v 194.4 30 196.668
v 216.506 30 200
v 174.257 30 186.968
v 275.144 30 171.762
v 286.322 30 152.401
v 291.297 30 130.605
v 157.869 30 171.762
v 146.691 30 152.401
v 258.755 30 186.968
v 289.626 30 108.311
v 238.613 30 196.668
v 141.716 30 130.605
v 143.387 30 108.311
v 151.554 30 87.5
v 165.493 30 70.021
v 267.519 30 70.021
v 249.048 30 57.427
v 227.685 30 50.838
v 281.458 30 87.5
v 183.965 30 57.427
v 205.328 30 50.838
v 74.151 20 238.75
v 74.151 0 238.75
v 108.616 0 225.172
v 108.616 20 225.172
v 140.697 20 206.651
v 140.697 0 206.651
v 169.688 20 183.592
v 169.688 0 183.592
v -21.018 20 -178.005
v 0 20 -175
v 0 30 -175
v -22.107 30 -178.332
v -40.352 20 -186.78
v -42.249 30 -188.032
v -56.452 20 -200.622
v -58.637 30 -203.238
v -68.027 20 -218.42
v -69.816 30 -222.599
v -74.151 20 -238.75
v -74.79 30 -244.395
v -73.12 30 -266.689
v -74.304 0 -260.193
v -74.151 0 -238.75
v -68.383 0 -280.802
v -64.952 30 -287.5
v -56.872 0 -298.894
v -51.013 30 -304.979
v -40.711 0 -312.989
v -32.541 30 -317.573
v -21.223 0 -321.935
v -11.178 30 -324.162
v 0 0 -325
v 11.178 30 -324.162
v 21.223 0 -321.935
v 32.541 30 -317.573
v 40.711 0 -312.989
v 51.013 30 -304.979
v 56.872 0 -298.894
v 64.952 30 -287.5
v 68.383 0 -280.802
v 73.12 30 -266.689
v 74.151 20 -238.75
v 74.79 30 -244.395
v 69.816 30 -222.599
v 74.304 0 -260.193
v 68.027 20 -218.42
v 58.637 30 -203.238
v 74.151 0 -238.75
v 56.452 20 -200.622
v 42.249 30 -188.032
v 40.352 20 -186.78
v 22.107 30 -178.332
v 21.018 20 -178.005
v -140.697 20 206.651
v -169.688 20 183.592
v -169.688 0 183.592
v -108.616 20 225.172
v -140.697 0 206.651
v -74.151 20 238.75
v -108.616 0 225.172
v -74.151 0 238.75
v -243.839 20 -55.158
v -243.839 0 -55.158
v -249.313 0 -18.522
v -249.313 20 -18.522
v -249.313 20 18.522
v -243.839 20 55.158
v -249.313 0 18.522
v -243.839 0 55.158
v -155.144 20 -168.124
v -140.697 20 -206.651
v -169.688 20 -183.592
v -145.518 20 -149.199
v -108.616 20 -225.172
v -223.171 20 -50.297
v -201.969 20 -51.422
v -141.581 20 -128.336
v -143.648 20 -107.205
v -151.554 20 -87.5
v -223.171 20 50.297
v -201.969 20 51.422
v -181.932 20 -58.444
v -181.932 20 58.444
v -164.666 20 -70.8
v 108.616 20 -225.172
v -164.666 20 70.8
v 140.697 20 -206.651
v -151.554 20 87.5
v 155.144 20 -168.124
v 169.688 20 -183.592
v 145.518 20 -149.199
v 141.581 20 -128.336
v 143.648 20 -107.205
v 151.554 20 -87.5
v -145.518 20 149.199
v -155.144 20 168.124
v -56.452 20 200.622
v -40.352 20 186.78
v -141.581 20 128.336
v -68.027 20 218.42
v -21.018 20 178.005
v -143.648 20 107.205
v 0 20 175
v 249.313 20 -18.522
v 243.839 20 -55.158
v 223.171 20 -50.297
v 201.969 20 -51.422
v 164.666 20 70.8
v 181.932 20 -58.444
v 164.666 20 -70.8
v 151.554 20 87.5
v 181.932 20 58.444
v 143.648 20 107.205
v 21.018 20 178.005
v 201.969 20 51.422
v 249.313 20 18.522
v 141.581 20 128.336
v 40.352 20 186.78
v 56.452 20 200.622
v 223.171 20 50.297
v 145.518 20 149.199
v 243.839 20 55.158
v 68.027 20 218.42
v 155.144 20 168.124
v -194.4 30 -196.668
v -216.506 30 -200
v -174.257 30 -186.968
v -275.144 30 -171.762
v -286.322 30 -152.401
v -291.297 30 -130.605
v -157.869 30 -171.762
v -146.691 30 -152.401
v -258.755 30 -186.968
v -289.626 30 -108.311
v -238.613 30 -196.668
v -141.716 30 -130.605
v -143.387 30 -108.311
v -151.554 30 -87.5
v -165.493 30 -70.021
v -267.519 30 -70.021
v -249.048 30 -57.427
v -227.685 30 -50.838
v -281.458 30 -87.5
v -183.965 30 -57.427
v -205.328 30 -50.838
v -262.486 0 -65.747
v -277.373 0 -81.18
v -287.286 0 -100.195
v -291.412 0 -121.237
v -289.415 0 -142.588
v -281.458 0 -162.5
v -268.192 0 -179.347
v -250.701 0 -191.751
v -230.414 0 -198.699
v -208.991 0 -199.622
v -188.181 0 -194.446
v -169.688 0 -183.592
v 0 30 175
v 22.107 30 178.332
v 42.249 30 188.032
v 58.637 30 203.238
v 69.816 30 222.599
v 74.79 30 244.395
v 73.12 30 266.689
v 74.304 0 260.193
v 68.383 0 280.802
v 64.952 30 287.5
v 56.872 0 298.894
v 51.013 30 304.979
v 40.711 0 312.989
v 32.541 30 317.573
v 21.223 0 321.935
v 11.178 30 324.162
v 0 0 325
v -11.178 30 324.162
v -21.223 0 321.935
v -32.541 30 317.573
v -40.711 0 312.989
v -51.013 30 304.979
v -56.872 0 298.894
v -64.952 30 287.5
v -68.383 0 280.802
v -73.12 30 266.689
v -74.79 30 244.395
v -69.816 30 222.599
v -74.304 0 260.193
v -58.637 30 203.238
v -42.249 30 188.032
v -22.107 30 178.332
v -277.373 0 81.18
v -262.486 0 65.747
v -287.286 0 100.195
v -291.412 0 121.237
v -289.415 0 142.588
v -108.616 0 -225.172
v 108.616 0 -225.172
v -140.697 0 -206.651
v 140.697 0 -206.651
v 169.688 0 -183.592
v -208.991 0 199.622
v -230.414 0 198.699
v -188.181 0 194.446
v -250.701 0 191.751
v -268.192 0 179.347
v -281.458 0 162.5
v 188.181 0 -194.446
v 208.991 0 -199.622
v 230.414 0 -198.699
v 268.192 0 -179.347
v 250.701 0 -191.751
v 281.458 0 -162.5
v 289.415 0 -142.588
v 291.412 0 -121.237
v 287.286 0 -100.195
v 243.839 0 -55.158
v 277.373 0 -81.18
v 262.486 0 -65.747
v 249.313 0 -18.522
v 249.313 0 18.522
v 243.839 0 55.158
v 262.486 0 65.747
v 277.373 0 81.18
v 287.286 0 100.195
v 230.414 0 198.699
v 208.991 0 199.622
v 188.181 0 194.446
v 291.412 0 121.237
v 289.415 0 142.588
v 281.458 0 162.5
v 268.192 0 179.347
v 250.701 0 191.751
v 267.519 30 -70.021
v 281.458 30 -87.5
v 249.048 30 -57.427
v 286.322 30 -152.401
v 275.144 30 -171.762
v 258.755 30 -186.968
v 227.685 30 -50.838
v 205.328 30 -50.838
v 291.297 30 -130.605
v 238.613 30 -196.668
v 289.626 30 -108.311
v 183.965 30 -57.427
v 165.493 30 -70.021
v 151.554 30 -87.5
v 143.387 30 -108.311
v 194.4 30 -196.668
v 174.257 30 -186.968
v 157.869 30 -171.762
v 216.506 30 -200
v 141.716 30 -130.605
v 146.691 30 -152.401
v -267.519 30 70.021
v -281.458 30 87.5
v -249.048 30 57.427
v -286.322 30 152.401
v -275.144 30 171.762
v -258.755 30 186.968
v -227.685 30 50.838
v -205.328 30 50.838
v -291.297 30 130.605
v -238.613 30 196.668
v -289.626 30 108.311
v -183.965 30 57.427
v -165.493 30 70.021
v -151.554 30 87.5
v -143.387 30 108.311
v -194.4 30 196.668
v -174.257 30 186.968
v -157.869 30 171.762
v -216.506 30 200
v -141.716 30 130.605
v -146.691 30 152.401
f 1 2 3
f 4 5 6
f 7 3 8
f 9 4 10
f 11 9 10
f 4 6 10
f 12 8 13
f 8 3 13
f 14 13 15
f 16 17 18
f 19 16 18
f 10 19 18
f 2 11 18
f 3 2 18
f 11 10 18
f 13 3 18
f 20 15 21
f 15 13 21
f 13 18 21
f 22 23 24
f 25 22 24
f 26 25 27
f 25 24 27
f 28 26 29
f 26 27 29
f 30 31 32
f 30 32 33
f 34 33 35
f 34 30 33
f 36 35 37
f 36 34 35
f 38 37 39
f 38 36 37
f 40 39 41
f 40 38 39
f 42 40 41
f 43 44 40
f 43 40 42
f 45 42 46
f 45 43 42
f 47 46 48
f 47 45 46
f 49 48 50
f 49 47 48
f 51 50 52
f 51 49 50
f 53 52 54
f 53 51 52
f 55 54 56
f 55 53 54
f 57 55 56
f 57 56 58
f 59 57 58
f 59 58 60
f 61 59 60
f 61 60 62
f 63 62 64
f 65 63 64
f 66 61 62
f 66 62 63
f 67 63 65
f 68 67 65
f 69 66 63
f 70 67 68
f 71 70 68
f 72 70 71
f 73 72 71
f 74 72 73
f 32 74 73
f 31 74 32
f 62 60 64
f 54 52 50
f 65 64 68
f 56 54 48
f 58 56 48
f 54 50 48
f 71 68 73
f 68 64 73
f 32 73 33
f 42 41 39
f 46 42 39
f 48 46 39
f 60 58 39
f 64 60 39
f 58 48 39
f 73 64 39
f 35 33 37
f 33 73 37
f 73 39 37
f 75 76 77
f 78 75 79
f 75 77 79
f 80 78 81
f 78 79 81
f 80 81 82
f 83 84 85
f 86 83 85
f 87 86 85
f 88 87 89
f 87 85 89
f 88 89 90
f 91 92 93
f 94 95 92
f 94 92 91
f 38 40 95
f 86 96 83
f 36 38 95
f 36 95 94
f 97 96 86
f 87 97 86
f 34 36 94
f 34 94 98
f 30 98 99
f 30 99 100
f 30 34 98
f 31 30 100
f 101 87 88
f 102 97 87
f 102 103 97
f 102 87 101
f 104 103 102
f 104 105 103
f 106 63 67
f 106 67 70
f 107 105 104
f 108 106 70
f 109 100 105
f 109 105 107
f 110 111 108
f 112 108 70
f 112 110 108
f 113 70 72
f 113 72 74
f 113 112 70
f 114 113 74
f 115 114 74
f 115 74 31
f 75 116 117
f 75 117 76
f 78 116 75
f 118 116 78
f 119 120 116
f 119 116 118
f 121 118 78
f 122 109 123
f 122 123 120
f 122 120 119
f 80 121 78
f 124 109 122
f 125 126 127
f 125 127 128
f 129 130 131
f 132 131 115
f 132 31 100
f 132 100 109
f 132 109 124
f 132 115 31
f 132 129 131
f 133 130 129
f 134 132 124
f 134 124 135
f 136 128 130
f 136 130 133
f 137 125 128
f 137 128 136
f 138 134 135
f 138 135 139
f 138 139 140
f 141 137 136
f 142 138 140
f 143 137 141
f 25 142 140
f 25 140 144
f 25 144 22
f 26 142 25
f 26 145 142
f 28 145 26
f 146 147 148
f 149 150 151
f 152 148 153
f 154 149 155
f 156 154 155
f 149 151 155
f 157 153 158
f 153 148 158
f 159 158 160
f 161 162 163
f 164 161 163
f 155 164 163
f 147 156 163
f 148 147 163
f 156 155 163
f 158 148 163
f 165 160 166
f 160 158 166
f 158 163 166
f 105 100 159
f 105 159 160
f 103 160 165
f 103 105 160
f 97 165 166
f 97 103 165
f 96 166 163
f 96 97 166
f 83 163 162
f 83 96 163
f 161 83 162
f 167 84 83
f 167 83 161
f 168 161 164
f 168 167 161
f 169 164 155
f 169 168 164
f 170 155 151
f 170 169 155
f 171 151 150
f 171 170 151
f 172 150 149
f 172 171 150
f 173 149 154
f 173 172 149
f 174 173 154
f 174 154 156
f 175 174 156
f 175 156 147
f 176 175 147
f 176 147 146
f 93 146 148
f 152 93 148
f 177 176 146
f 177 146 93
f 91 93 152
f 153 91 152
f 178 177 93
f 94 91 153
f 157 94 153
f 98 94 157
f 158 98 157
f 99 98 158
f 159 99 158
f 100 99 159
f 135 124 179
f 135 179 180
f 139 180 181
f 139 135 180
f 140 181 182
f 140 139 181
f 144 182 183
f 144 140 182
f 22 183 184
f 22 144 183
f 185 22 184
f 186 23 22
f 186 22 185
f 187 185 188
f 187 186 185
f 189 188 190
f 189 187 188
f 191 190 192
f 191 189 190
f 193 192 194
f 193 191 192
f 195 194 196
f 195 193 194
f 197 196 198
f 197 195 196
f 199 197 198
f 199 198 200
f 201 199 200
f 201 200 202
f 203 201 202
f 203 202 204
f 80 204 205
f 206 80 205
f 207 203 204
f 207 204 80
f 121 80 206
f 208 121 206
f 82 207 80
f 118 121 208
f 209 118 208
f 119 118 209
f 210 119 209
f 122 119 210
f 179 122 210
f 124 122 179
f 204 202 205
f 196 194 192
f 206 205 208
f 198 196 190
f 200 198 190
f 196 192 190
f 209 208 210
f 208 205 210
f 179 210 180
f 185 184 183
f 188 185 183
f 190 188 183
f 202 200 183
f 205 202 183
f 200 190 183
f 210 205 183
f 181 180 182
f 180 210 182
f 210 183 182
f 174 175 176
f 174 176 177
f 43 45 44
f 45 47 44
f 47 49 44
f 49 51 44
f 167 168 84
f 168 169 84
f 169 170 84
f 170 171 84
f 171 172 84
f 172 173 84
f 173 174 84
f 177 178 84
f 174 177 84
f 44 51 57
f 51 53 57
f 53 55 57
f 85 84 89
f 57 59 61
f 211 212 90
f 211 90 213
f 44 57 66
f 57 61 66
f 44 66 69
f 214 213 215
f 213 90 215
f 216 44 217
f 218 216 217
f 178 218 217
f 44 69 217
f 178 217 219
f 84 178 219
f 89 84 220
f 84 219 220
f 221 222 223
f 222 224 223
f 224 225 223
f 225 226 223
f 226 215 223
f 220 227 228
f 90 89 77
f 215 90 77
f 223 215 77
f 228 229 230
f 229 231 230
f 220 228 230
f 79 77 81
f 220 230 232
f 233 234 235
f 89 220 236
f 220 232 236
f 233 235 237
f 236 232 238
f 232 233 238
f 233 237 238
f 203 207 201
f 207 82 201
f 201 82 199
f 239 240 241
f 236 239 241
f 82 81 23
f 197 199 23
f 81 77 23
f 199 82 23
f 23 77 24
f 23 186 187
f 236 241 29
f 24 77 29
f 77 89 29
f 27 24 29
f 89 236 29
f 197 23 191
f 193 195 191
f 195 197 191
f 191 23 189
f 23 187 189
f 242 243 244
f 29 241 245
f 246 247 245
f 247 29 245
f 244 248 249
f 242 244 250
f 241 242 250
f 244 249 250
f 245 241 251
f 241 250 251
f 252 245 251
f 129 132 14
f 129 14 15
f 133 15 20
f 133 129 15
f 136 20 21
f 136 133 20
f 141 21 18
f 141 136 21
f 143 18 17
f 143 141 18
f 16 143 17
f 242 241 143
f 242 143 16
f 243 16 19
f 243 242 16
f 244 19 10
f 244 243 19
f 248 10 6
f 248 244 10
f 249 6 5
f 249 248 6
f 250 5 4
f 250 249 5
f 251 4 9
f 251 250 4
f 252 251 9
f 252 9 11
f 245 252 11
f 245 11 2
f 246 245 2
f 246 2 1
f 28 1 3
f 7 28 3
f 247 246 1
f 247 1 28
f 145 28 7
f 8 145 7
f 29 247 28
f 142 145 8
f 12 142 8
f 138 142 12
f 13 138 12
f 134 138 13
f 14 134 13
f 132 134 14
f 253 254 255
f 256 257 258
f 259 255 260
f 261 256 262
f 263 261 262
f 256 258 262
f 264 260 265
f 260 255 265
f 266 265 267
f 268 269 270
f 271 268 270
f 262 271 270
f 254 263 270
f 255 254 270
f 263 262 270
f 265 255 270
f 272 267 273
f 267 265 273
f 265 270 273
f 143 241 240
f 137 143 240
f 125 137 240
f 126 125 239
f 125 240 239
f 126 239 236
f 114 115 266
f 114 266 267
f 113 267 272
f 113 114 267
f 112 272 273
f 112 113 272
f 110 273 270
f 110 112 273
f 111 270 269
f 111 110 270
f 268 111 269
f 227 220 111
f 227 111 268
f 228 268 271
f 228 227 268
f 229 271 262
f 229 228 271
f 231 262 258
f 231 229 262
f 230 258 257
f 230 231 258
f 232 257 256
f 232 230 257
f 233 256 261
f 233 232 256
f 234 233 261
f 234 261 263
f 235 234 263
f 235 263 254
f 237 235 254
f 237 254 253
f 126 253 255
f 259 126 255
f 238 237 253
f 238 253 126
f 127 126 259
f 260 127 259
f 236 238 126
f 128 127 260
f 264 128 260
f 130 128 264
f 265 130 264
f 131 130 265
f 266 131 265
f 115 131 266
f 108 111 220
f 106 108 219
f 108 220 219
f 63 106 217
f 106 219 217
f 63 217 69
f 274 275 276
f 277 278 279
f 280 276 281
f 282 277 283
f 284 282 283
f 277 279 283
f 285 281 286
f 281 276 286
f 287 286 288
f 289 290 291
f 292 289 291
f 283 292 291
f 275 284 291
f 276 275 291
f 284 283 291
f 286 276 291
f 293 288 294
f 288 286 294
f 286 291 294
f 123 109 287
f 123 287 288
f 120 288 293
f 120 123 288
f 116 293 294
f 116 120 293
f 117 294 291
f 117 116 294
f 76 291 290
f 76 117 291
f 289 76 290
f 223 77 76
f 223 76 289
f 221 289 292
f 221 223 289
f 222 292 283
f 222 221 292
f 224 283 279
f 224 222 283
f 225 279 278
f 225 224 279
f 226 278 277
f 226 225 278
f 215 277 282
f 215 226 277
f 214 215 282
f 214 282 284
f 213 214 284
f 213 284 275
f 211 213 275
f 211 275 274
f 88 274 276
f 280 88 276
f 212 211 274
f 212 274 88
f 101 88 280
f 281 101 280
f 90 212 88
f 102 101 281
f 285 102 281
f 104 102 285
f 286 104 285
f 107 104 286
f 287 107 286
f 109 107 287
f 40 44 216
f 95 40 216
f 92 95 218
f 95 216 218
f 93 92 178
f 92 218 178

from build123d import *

# Parameters (mm, degrees)
ESQUISSE2_R                  = 250
BOSS_EXTRU_2_DEPTH           = 20
ESQUISSE3_R                  = 75
BOSS_EXTRU_3_DEPTH           = 30
R_P_TITION_CIRCULAIRE1_COUNT = 6


with BuildPart() as part:
    # Esquisse2 → Boss.-Extru.2 (new body)
    with BuildSketch(Plane(origin=(0, 0, 0), x_dir=(1, 0, 0), z_dir=(0, 1, 0))):
        with Locations(Location((0, 0, 0), (0, 0, 270))):
            Circle(ESQUISSE2_R)
    extrude(amount=BOSS_EXTRU_2_DEPTH)

    # Esquisse3 → Boss.-Extru.3 (add)
    with BuildSketch(Plane.XZ):
        with Locations(Location((0, 250, 0), (0, 0, 270))):
            Circle(ESQUISSE3_R)
    boss_extru_3 = extrude(amount=-BOSS_EXTRU_3_DEPTH)

    # Répétition circulaire1: Boss.-Extru.3 ×6 about axis
    r_p_tition_circulaire1_axis = Axis((0, 0, 0), (0, 1, 0))
    for i in range(1, R_P_TITION_CIRCULAIRE1_COUNT):
        add(boss_extru_3.rotate(r_p_tition_circulaire1_axis, i * 360 / R_P_TITION_CIRCULAIRE1_COUNT))


solid = part.part
